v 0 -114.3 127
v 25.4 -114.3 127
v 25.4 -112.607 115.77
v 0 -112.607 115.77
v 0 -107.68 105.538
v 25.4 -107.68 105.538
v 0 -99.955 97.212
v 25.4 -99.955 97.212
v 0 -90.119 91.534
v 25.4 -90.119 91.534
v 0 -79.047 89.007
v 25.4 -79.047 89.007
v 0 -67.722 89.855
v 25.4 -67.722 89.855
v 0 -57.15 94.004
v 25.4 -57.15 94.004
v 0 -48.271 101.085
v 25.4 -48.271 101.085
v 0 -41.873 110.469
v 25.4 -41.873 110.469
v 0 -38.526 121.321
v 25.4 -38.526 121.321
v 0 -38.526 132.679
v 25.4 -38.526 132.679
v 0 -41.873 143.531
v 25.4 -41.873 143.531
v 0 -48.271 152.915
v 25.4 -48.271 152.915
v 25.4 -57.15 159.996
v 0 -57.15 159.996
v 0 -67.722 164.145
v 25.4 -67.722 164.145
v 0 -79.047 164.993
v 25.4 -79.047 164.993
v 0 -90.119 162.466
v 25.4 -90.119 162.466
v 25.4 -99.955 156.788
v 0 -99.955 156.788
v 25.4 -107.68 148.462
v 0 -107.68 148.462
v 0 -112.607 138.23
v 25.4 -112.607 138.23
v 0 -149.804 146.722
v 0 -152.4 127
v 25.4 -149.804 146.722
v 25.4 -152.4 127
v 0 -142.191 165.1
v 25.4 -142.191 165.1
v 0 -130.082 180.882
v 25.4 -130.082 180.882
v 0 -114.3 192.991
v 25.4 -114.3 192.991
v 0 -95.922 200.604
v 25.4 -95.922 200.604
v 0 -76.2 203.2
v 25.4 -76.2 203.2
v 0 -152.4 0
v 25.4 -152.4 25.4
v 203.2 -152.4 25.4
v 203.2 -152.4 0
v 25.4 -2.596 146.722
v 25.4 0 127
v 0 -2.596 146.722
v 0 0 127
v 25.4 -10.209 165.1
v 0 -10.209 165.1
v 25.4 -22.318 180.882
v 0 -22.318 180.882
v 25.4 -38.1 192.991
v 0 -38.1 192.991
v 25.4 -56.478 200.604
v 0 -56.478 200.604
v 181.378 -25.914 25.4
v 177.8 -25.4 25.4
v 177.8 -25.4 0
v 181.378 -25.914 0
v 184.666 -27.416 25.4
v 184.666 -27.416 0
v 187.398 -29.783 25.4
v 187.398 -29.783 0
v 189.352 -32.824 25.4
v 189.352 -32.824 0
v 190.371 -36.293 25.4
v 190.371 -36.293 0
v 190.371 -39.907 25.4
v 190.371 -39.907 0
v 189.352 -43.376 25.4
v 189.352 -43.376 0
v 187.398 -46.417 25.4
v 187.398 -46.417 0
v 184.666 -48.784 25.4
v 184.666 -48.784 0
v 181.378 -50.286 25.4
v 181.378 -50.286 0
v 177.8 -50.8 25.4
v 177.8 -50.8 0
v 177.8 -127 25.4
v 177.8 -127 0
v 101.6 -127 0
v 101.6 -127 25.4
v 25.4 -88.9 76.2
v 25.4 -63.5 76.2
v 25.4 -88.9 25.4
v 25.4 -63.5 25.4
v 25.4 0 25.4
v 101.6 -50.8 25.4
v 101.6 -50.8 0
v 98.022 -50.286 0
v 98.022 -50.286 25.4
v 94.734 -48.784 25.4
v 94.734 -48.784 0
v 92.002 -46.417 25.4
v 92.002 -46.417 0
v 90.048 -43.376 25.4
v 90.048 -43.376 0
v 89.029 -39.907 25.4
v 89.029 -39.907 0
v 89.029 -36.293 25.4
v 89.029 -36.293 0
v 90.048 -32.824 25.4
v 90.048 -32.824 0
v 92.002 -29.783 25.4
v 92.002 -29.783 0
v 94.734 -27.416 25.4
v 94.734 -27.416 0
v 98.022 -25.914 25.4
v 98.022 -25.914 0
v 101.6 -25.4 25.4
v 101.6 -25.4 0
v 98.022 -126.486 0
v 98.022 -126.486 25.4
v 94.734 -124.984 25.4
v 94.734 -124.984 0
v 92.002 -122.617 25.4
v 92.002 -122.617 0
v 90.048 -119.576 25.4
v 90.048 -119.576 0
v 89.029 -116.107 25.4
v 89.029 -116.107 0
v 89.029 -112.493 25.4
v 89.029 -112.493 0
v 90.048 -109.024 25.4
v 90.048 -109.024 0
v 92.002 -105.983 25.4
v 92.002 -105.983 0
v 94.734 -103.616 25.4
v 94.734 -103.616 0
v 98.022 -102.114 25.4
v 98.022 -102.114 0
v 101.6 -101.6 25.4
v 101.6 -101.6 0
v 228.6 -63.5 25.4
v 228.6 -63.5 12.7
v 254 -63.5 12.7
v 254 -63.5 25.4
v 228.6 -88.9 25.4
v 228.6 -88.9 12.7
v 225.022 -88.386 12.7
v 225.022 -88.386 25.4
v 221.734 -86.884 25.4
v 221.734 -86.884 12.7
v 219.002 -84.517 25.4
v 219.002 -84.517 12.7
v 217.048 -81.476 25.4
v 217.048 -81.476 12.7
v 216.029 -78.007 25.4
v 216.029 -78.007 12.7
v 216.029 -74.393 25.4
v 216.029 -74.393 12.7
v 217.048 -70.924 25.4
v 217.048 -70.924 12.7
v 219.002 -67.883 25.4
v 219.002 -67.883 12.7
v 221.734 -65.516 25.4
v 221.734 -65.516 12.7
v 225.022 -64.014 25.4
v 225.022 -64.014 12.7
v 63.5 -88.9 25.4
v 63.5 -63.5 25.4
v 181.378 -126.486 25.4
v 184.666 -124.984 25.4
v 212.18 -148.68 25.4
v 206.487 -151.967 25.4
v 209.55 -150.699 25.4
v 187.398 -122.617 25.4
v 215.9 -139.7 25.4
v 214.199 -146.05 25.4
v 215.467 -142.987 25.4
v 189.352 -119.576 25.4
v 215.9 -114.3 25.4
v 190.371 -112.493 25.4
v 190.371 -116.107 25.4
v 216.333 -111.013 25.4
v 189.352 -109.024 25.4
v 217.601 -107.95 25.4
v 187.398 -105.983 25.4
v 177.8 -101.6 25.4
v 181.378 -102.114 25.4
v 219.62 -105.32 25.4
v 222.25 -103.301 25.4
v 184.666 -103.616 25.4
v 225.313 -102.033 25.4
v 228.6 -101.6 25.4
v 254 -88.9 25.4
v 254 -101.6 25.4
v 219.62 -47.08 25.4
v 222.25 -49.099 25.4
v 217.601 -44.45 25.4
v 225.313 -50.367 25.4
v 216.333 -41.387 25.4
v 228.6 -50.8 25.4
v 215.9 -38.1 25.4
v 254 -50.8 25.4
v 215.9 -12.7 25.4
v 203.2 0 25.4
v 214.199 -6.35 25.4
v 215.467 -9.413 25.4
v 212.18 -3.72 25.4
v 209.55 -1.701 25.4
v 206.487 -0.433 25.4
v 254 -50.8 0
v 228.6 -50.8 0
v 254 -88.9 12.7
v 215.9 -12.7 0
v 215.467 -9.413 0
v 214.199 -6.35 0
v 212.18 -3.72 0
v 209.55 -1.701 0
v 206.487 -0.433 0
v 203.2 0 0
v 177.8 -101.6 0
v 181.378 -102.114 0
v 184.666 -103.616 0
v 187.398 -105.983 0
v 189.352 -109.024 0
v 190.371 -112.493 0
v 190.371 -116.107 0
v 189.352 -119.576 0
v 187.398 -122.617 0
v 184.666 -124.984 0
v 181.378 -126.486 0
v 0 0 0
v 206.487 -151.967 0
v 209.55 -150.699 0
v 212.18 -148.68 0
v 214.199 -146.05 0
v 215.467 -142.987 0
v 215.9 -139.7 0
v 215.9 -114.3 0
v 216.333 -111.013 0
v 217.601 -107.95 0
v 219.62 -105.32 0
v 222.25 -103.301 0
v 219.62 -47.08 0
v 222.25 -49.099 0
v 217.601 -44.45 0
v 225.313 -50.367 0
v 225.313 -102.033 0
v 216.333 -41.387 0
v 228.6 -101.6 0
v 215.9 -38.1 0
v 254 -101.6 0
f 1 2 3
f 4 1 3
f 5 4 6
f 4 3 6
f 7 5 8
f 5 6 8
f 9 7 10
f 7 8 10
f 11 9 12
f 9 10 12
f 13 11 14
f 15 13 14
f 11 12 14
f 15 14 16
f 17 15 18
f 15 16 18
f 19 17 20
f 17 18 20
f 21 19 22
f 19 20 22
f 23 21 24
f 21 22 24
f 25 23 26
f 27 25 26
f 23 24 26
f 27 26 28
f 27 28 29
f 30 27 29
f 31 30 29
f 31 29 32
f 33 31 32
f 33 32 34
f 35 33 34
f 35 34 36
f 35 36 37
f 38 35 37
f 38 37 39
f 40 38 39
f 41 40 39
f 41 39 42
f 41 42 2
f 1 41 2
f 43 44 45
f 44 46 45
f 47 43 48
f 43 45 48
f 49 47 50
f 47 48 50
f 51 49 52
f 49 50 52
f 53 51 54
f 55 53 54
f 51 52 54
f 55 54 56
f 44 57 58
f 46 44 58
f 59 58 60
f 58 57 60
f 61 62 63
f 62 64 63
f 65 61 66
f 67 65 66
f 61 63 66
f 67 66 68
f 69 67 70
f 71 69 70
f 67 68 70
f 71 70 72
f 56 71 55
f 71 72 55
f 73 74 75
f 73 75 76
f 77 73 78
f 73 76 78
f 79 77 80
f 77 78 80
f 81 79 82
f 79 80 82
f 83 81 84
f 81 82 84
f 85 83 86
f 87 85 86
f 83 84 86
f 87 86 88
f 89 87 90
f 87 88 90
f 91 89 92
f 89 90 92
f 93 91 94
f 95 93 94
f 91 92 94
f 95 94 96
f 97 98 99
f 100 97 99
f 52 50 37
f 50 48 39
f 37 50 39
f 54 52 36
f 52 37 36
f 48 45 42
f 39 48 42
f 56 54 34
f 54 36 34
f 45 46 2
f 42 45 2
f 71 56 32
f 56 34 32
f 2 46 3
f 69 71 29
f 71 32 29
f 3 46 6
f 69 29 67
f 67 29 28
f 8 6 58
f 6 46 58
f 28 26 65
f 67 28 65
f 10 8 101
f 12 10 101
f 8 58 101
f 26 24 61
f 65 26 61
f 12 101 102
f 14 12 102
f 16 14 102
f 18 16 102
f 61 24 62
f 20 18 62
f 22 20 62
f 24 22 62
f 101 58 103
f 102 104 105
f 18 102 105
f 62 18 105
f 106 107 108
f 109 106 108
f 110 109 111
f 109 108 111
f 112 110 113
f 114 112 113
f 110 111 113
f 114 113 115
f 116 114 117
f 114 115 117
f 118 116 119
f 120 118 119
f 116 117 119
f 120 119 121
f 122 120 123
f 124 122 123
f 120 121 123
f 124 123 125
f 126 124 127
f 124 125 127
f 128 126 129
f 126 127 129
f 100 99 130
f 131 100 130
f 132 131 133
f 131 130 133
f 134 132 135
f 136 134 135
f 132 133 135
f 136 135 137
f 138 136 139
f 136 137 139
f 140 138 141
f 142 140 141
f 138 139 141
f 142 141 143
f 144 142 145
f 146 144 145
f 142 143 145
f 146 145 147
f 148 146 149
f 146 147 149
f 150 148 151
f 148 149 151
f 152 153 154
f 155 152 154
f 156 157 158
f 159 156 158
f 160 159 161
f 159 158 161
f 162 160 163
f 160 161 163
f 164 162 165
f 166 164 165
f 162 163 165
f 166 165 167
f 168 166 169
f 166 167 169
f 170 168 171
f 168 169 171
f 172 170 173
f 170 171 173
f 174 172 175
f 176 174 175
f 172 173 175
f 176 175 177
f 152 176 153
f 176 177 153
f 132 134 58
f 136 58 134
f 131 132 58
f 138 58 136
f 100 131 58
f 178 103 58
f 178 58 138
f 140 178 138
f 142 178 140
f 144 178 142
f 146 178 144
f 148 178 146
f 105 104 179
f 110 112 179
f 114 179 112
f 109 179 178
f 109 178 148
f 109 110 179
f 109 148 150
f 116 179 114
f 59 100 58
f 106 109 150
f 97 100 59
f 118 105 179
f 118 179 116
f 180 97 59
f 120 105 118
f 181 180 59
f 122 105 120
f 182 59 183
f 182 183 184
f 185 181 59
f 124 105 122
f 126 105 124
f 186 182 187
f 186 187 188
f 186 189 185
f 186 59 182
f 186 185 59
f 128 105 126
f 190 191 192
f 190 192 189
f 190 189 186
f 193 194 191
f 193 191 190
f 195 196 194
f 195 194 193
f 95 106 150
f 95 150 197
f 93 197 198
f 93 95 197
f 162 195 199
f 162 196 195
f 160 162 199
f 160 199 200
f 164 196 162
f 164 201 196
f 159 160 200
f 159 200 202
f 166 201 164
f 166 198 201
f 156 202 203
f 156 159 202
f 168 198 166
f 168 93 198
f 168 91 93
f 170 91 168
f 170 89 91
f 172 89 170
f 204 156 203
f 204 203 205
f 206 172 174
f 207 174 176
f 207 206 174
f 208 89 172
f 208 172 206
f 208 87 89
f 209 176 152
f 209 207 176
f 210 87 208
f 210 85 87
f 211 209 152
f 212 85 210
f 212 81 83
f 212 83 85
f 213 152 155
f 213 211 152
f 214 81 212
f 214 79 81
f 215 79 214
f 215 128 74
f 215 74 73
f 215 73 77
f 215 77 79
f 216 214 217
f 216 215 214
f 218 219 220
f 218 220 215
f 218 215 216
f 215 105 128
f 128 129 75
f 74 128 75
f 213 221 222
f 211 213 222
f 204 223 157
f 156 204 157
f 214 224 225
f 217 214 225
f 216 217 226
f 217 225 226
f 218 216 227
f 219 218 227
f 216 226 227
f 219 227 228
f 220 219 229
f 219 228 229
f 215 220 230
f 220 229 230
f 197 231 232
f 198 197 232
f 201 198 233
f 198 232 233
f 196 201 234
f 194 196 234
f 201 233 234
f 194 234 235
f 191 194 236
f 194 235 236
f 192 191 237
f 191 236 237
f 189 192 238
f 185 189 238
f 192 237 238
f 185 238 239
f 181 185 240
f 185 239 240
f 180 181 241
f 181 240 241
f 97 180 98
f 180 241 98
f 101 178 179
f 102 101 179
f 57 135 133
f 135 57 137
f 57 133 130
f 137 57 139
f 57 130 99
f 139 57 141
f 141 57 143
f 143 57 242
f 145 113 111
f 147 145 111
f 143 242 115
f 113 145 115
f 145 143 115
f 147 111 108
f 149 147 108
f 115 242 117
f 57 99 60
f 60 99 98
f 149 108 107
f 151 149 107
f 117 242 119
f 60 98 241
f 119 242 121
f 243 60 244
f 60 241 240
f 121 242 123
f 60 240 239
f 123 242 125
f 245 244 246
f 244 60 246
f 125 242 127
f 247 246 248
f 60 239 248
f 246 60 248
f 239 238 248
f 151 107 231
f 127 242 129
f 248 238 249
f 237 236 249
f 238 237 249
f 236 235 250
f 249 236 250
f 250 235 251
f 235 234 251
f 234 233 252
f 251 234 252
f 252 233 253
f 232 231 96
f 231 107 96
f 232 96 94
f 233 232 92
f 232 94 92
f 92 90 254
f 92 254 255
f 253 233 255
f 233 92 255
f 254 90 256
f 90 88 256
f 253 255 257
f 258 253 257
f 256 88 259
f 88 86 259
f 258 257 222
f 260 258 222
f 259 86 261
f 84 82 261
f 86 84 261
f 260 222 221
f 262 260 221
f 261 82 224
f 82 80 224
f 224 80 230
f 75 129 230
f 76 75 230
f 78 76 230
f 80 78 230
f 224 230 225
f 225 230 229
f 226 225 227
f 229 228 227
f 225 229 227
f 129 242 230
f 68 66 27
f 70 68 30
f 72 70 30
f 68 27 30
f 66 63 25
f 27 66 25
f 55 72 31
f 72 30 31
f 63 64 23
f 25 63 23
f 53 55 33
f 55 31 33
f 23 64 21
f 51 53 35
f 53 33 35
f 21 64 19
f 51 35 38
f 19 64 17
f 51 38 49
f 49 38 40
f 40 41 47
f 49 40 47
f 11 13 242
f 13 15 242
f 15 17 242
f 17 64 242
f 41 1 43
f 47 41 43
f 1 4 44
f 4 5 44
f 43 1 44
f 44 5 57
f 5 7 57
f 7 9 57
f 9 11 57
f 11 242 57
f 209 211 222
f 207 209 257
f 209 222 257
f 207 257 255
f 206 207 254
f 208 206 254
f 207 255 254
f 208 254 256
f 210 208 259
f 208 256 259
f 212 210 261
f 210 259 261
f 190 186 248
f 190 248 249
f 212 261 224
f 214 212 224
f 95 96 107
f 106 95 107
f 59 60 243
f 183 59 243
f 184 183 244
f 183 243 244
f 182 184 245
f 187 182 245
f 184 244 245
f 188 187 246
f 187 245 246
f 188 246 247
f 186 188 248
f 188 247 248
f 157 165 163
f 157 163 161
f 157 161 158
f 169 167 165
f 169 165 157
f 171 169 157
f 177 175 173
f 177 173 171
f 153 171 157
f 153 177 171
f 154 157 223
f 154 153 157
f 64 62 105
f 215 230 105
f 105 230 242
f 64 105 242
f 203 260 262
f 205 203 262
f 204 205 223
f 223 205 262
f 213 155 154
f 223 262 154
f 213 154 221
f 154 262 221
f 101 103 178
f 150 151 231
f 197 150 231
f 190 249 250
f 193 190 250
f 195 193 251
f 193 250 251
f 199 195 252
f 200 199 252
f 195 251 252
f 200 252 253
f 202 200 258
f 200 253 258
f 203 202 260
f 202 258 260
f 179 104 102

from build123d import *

# Parameters (mm, degrees)
F1_DEPTH = 203.2
F2_DEPTH = 25.4
F3_DEPTH = 12.7
F0_W     = 38.1
F0_H     = 25.4
F4_DEPTH = 76.2
F6_R     = 76.19999
F7_D     = 76.2
F8_SIZE2 = 38.09999
F8_SIZE  = 50.79999


# Not quite as in the source:
# - a fillet or chamfer is up to 0.001 mm smaller than in the source, because OpenCascade refuses the exact size


with BuildPart() as f1:
    # F0 (on Top) → F1 (new body)
    with BuildSketch(Plane.XY):
        Polygon((25.4, 0), (0, 0), (0, -152.4), (25.4, -152.4), (25.4, -88.9), (25.4, -63.5), align=None)
    extrude(amount=F1_DEPTH)

    # F0 (on Top) → F2 (join)
    with BuildSketch(Plane.XY):
        with BuildLine():
            Line((101.6, 0), (25.4, 0))
            Line((25.4, 0), (25.4, -63.5))
            Line((25.4, -63.5), (63.5, -63.5))
            Line((63.5, -63.5), (63.5, -88.9))
            Line((63.5, -88.9), (25.4, -88.9))
            Line((25.4, -88.9), (25.4, -152.4))
            Line((25.4, -152.4), (101.6, -152.4))
            Line((101.6, -152.4), (203.2, -152.4))
            ThreePointArc((203.2, -152.4), (212.1802561211, -148.6802561211), (215.9, -139.7))
            Line((215.9, -139.7), (215.9, -114.3))
            ThreePointArc((215.9, -114.3), (219.6197438789, -105.3197438789), (228.6, -101.6))
            Line((228.6, -101.6), (254, -101.6))
            Line((254, -101.6), (254, -88.9))
            Line((254, -88.9), (228.6, -88.9))
            ThreePointArc((228.6, -88.9), (215.9, -76.2), (228.6, -63.5))
            Line((228.6, -63.5), (254, -63.5))
            Line((254, -63.5), (254, -50.8))
            Line((254, -50.8), (228.6, -50.8))
            ThreePointArc((228.6, -50.8), (219.6197438789, -47.0802561211), (215.9, -38.1))
            Line((215.9, -38.1), (215.9, -12.7))
            ThreePointArc((215.9, -12.7), (212.1802561211, -3.7197438789), (203.2, 0))
            Line((203.2, 0), (101.6, 0))
        make_face()
        with BuildLine():
            Line((177.8, -127), (101.6, -127))
            ThreePointArc((101.6, -127), (88.9, -114.3), (101.6, -101.6))
            Line((101.6, -101.6), (177.8, -101.6))
            ThreePointArc((177.8, -101.6), (190.5, -114.3), (177.8, -127))
        make_face(mode=Mode.SUBTRACT)
        with BuildLine():
            ThreePointArc((101.6, -50.8), (88.9, -38.1), (101.6, -25.4))
            Line((101.6, -25.4), (177.8, -25.4))
            ThreePointArc((177.8, -25.4), (190.5, -38.1), (177.8, -50.8))
            Line((177.8, -50.8), (101.6, -50.8))
        make_face(mode=Mode.SUBTRACT)
    extrude(amount=F2_DEPTH)

    # F0 (on Top) → F3 (join)
    with BuildSketch(Plane.XY):
        Polygon((254, -88.9), (254, -63.5), (228.6, -63.5), (228.6, -76.2), (228.6, -88.9), align=None)
        with BuildLine():
            Line((228.6, -76.2), (228.6, -63.5))
            ThreePointArc((228.6, -63.5), (215.9, -76.2), (228.6, -88.9))
            Line((228.6, -88.9), (228.6, -76.2))
        make_face()
    extrude(amount=F3_DEPTH)

    # F0 (on Top) → F4 (join)
    with BuildSketch(Plane.XY):
        with Locations((44.45, -76.2)):
            Rectangle(F0_W, F0_H)
    extrude(amount=F4_DEPTH)

    # F6 (radius 76.2 in the source; OpenCascade refuses exactly that, so slightly less here)
    f6_edges = [f1.edges().sort_by_distance(p)[0] for p in [
        (12.7, -152.4, 203.2),
        (12.7, 0, 203.2),
    ]]
    fillet(f6_edges, radius=F6_R)

    # F7 (through all)
    with Locations(Plane(origin=(0, 0, 0), x_dir=(0, 1, 0), z_dir=(-1, 0, 0))):
        with Locations((-76.2, -127)):
            Hole(F7_D / 2)

    # F8 (size 50.8 and 38.0999999365 in the source; OpenCascade refuses exactly that, so slightly less here)
    f8_edges = [f1.edges().sort_by_distance(p)[0] for p in [
        (63.5, -76.2, 76.2),
    ]]
    f8_side = f1.faces().sort_by_distance((63.5, -76.2, 50.8))[0]
    chamfer(f8_edges, length=F8_SIZE, length2=F8_SIZE2, reference=f8_side)


solid = f1.part
